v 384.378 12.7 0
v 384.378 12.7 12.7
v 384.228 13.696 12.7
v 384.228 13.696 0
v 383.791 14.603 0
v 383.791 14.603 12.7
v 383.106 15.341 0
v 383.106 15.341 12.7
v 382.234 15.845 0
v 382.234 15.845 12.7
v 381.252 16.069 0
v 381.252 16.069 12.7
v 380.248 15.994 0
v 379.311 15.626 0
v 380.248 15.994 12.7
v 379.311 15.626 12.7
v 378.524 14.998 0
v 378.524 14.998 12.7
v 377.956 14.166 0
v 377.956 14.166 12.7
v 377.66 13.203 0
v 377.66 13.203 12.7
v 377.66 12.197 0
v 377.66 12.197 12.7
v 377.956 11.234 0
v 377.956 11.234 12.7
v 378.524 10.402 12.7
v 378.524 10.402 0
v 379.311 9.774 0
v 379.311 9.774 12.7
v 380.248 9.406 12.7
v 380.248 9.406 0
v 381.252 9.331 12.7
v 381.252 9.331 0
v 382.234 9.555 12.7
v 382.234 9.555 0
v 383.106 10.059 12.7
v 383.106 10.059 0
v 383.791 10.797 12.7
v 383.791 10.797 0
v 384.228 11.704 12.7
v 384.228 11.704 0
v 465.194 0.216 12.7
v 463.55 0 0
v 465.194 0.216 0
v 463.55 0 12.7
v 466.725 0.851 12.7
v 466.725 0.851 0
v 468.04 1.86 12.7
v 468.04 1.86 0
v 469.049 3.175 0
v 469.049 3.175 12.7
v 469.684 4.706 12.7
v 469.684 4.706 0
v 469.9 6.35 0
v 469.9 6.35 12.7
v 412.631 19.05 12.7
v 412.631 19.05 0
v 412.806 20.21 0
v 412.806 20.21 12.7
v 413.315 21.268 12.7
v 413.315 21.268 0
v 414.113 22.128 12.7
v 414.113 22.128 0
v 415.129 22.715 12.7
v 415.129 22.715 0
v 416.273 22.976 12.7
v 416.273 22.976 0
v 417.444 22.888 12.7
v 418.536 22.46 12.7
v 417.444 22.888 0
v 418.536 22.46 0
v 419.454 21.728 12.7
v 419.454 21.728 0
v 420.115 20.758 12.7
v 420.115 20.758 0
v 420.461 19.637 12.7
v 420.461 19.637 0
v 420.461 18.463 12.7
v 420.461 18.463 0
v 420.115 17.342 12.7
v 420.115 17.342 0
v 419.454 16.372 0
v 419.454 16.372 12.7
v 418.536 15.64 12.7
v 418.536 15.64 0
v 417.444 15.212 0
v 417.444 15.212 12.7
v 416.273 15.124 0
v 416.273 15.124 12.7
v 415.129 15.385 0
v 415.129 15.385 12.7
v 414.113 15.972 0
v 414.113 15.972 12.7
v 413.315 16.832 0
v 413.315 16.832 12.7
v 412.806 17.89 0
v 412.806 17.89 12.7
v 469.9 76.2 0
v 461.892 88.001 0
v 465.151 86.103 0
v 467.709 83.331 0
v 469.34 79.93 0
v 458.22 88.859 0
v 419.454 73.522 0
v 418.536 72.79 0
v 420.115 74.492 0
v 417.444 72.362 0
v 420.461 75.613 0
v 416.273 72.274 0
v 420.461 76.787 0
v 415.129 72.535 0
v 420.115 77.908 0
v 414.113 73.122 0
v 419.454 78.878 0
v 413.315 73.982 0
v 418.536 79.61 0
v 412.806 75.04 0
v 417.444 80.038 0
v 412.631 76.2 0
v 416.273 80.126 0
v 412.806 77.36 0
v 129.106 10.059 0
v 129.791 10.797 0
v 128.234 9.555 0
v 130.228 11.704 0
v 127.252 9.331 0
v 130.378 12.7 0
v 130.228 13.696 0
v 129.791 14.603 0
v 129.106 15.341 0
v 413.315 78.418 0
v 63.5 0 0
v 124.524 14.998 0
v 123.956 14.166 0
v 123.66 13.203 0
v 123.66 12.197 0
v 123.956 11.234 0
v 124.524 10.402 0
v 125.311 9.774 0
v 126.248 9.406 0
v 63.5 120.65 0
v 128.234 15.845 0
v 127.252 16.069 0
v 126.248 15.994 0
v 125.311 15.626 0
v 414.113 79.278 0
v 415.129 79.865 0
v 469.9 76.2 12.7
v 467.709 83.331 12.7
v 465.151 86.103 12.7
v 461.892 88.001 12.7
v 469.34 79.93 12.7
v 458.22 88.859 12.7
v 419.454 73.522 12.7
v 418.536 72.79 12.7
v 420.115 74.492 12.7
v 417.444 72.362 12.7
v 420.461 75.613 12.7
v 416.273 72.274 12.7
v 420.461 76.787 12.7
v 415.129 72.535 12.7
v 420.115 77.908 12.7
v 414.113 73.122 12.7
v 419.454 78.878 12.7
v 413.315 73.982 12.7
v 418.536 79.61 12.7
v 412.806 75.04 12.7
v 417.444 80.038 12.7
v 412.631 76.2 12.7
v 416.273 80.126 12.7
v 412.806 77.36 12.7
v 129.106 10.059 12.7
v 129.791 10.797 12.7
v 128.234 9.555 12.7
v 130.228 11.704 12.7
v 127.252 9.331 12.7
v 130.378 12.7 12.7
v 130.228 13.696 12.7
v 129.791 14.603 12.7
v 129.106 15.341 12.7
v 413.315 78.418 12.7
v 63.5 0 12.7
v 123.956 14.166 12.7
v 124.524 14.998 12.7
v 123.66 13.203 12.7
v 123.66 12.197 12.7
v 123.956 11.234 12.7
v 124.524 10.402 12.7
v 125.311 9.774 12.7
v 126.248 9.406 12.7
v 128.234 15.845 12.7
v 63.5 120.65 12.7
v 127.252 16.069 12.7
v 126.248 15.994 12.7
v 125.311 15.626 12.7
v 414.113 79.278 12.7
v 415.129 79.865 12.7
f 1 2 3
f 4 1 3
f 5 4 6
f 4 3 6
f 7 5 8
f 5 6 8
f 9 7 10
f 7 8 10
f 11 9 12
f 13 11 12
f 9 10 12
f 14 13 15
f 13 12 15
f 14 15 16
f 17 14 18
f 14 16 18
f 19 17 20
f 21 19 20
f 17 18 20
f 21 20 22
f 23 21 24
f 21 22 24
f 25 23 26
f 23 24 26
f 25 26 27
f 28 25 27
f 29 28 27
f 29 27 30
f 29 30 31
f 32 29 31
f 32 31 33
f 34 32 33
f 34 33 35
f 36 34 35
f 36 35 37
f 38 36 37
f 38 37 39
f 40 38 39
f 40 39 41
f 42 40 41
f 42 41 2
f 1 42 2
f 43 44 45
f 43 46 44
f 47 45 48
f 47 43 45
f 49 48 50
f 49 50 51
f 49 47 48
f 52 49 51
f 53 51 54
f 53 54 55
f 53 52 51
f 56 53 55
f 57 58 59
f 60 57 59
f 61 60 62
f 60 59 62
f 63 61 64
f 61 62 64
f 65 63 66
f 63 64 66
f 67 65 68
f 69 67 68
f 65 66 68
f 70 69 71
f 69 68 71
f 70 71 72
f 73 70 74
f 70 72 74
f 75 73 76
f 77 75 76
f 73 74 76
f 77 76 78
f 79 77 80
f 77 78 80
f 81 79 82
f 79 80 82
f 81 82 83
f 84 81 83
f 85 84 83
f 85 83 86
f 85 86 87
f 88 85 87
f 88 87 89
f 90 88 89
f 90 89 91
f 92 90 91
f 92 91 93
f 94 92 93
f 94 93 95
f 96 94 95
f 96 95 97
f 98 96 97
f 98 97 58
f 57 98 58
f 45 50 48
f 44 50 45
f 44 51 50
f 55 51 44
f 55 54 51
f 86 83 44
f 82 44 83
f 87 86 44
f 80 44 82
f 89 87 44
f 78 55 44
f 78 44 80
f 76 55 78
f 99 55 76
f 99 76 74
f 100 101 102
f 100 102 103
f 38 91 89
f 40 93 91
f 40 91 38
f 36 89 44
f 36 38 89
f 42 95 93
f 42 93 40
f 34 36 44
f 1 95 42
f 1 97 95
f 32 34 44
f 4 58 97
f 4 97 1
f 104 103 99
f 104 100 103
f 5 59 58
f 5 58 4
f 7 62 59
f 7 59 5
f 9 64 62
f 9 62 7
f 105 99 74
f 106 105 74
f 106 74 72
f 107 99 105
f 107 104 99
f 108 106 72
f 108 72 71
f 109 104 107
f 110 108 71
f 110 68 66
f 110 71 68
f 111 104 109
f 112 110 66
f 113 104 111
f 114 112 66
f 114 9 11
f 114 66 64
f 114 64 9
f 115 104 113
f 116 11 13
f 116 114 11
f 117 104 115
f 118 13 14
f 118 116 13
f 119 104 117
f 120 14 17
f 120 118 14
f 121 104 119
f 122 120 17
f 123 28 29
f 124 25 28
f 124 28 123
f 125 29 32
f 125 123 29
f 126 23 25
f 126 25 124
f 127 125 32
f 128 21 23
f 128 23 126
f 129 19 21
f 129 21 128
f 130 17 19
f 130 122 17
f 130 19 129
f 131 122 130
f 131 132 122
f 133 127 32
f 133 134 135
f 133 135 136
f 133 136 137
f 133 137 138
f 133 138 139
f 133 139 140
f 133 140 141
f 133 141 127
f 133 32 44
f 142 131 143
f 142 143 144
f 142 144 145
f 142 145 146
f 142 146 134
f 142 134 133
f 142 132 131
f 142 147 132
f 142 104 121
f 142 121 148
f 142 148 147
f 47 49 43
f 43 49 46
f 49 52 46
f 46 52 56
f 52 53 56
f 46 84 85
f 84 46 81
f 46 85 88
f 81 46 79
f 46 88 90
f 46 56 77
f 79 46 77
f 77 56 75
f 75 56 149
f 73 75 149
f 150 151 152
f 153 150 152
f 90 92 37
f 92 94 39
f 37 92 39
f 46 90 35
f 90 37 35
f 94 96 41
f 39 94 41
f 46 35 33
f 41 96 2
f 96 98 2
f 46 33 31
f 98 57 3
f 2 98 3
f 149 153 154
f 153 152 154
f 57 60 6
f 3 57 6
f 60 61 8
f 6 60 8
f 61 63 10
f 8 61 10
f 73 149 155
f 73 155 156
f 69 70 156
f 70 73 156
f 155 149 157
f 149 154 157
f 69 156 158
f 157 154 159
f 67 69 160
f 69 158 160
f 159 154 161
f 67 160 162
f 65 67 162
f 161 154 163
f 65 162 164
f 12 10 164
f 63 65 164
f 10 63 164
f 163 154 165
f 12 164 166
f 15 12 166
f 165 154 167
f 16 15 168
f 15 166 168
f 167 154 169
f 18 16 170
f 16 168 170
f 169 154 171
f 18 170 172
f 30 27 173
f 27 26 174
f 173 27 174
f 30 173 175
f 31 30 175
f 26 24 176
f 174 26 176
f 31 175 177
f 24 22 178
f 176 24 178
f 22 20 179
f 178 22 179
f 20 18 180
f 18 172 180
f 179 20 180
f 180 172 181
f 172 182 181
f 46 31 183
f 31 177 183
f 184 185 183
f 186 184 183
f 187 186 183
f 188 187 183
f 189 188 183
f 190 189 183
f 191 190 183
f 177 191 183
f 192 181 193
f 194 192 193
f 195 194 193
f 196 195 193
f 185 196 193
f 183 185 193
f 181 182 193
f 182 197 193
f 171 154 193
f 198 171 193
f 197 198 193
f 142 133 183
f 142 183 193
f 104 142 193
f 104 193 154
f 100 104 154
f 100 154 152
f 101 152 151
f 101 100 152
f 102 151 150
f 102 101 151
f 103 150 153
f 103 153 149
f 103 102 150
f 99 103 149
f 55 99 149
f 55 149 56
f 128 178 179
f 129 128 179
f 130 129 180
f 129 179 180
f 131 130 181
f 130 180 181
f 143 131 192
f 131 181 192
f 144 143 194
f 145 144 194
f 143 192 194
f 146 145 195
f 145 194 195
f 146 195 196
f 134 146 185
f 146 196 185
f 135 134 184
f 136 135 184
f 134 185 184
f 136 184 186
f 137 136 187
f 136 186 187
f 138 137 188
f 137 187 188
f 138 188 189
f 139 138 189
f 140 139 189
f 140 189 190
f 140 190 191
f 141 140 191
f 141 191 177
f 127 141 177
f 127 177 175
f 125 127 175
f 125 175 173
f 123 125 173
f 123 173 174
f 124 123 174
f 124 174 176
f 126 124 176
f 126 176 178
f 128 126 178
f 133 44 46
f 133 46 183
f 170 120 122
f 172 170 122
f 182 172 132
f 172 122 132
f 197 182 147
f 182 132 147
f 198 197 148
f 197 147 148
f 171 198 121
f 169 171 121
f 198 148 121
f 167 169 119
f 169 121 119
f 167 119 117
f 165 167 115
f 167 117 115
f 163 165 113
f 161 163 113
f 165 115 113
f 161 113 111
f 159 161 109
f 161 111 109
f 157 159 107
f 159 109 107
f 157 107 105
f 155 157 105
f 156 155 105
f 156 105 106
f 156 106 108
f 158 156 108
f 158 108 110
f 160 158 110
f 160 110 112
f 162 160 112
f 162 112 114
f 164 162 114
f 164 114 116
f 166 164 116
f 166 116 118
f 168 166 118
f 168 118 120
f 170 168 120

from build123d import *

# Parameters (mm, degrees)
BOSS_EXTRUDE1_DEPTH = 12.7
SKETCH2_R           = 3.3782
CUT_EXTRUDE1_DEPTH  = 486.307863629
FILLET1_R           = 6.35
SKETCH4_R           = 3.937
CUT_EXTRUDE2_DEPTH  = 486.307863629


with BuildPart() as part:
    # Sketch1 → Boss-Extrude1 (new body)
    with BuildSketch(Plane.XY):
        with BuildLine():
            Line((63.5, 0), (63.5, 120.65))
            Line((63.5, 120.65), (458.219565432, 88.85900811))
            ThreePointArc((458.219565432, 88.85900811), (466.533768826, 84.812244743), (469.9, 76.2))
            Line((469.9, 76.2), (469.9, 0))
            Line((469.9, 0), (63.5, 0))
        make_face()
    extrude(amount=BOSS_EXTRUDE1_DEPTH)

    # Sketch2 → Cut-Extrude1 (cut, through all)
    with BuildSketch(Plane.XY.offset(12.7)):
        with Locations((127, 12.7)):
            Circle(SKETCH2_R)
        with Locations((381, 12.7)):
            Circle(SKETCH2_R)
    extrude(amount=-CUT_EXTRUDE1_DEPTH, mode=Mode.SUBTRACT)

    # Fillet1
    fillet1_edges = [part.edges().sort_by_distance(p)[0] for p in [
        (469.9, 0, 6.35),
    ]]
    fillet(fillet1_edges, radius=FILLET1_R)

    # Sketch4 → Cut-Extrude2 (cut, through all)
    with BuildSketch(Plane(origin=(0, 0, 0), x_dir=(-1, 0, 0), z_dir=(0, 0, -1))):
        with Locations((-416.56762, 76.2)):
            Circle(SKETCH4_R)
        with Locations((-416.56762, 19.05)):
            Circle(SKETCH4_R)
    extrude(amount=-CUT_EXTRUDE2_DEPTH, mode=Mode.SUBTRACT)


solid = part.part
